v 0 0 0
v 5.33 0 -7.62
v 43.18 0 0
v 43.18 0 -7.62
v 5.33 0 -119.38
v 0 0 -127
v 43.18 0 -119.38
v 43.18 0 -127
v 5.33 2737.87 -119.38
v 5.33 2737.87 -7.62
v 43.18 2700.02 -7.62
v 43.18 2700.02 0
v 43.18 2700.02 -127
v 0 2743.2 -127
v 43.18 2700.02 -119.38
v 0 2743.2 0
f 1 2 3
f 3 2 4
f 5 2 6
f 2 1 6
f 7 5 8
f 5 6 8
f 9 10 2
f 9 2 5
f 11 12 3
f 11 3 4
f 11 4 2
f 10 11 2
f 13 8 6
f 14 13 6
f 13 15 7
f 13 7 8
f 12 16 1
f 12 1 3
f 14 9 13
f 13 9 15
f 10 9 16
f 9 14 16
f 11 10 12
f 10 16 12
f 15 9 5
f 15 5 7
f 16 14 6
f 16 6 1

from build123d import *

# Parameters (mm, degrees)
BOSS_EXTRUDE2_DEPTH = 2743.2
CUT_EXTRUDE1_DEPTH  = 128


with BuildPart() as part:
    # Sketch3 → Boss-Extrude2 (new body)
    with BuildSketch(Plane(origin=(0, 0, 0), x_dir=(1, 0, 0), z_dir=(0, 1, 0))):
        Polygon((0, 0), (43.18, 0), (43.18, 7.62), (5.330413857, 7.62), (5.330413857, 119.38), (43.18, 119.38), (43.18, 127), (0, 127), align=None)
    extrude(amount=BOSS_EXTRUDE2_DEPTH)

    # Sketch5 → Cut-Extrude1 (cut, through all)
    with BuildSketch(Plane.XY):
        Polygon((0, 2743.2), (43.18, 2700.02), (43.18, 2743.2), align=None)
    extrude(amount=-CUT_EXTRUDE1_DEPTH, mode=Mode.SUBTRACT)


solid = part.part
